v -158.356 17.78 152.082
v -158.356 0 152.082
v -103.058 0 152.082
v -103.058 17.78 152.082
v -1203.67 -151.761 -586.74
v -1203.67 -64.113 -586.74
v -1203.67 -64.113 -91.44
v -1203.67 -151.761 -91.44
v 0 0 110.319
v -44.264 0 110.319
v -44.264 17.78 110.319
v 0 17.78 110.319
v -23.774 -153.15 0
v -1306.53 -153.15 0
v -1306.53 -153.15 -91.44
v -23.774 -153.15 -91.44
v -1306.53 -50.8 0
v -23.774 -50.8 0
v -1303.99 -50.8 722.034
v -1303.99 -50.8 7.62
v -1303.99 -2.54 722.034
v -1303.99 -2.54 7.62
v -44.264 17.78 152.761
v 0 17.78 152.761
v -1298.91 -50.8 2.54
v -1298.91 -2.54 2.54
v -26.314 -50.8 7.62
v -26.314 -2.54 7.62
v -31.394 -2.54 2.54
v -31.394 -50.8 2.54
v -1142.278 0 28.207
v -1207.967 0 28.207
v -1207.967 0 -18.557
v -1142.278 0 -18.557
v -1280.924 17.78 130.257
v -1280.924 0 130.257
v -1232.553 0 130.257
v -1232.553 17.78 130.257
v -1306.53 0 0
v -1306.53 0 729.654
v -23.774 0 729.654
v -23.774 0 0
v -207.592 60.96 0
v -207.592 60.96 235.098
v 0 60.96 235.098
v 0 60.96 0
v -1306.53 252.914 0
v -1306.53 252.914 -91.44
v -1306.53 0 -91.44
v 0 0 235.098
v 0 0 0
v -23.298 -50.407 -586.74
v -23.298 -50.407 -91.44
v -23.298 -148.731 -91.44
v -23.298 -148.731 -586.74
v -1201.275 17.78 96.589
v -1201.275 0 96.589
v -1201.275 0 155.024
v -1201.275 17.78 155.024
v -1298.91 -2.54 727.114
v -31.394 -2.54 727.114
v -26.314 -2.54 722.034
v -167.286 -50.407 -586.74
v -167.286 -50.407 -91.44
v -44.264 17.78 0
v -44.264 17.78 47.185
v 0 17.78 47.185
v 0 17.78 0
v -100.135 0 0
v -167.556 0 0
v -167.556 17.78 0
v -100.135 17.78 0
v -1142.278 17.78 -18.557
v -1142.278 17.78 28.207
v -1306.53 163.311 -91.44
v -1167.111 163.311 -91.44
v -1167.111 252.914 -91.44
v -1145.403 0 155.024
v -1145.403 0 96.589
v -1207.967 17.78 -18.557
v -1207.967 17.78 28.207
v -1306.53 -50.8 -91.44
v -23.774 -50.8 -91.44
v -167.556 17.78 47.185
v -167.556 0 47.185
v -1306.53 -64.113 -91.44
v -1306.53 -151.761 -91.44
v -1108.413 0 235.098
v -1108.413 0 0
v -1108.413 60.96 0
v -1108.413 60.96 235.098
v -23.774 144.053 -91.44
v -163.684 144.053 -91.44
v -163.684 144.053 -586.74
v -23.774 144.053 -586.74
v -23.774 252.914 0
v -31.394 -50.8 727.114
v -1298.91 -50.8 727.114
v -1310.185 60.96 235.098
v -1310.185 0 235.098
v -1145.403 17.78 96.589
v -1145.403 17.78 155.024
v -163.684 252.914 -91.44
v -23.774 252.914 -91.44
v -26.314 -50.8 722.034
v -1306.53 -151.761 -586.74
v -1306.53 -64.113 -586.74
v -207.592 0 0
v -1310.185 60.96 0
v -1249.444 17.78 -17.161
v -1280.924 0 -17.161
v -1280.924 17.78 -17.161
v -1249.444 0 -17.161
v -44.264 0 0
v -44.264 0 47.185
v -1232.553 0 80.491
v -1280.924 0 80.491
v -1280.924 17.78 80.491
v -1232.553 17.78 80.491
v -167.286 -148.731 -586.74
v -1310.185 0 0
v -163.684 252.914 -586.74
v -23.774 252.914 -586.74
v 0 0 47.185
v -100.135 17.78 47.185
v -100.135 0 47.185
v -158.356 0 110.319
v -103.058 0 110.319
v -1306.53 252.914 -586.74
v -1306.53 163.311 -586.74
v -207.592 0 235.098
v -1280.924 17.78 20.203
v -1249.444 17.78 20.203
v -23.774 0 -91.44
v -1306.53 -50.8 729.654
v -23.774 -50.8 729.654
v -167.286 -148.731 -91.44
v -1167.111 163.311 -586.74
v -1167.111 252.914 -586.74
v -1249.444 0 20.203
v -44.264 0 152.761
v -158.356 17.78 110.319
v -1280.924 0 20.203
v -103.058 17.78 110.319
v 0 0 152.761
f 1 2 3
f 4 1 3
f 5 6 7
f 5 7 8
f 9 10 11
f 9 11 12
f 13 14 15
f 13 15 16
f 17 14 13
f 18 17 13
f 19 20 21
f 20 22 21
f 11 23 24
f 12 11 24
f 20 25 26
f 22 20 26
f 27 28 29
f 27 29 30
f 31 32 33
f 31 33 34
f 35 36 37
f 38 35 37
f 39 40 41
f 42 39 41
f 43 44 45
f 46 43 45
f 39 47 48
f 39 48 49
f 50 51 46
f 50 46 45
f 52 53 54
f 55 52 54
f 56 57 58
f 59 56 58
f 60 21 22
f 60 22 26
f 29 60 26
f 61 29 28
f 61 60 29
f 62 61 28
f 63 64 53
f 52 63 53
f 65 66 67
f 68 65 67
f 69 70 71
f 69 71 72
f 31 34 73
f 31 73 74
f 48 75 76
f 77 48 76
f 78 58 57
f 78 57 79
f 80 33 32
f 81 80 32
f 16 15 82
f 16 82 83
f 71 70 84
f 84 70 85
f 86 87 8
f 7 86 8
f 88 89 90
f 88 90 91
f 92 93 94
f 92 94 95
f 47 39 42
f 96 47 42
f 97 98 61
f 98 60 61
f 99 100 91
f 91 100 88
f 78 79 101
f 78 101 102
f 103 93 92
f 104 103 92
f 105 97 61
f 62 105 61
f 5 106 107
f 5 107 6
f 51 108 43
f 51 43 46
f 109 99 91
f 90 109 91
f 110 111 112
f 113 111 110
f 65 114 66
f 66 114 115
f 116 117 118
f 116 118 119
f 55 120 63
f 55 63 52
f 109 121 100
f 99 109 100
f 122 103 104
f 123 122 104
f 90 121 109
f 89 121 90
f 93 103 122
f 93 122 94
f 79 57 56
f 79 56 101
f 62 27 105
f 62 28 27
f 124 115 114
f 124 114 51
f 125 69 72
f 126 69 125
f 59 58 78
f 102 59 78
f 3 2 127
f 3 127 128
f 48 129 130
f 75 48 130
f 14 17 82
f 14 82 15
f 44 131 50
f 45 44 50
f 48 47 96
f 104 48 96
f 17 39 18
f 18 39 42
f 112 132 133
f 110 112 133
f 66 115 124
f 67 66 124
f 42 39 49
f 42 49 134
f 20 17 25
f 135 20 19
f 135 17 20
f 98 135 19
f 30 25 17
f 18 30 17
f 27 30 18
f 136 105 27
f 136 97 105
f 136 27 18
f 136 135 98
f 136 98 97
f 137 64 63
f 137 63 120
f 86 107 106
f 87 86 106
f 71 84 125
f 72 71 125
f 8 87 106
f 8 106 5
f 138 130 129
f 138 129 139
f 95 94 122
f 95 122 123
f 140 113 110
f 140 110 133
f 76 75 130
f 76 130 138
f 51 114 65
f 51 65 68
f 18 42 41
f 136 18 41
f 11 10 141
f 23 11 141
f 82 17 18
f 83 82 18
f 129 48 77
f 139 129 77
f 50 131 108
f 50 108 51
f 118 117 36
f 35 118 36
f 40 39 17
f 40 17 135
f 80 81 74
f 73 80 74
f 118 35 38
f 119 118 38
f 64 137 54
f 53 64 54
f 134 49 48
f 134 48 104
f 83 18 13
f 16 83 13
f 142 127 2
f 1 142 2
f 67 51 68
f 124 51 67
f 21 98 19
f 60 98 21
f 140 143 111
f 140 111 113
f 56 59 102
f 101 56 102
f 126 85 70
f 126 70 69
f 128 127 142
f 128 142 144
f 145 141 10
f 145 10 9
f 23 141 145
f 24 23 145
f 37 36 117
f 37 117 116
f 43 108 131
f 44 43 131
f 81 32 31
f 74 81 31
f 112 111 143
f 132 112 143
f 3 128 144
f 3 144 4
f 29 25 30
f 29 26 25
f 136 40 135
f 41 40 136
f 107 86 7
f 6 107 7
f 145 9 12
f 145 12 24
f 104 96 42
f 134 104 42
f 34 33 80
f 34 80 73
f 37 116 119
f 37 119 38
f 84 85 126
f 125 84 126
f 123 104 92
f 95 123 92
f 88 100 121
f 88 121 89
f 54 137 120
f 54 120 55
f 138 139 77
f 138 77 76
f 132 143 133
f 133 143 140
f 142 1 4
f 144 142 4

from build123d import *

# Parameters (mm, degrees)
F0_W      = 1282.7554736286
F0_H      = 729.6538352966
F1_DEPTH  = 50.8
F2_T      = -2.54
F3_SIZE   = 5.08
F4_W      = 1282.7554736286
F4_H      = 252.9141306877
F5_DEPTH  = 91.44
F4_H_2    = 102.3504243612
F6_W      = 102.859377861
F6_H      = 87.6475647092
F7_DEPTH  = 495.3
F6_W_2    = 139.9095300585
F6_H_2    = 108.8606417179
F6_W_3    = 139.4186019897
F6_H_3    = 89.6030068398
F6_W_4    = 143.9883280545
F6_H_4    = 98.3233042061
F8_W      = 207.591548562
F8_H      = 235.0982874632
F9_DEPTH  = 60.96
F8_W_2    = 201.7714977264
F10_W     = 44.2638136446
F10_H     = 42.4424037337
F11_DEPTH = 17.78
F10_W_2   = 55.2980303764
F10_H_2   = 41.7627468705
F10_H_3   = 47.184728086
F10_W_3   = 67.4202218652
F10_W_4   = 55.8717250824
F10_H_4   = 58.4349855781
F10_W_5   = 48.3711957932
F10_H_5   = 49.7663617134
F10_W_6   = 65.6886100769
F10_H_6   = 46.763850376
F10_W_7   = 31.4800739288
F10_H_7   = 37.3639315367


with BuildPart() as f1:
    # F0 (on Front) → F1 (new body)
    with BuildSketch(Plane.XZ):
        with Locations((-665.1519043371, 364.8269176483)):
            Rectangle(F0_W, F0_H)
    extrude(amount=F1_DEPTH)

    # F2
    f2_openings = [f1.faces().sort_by_distance(p)[0] for p in [
        (-665.151904, -50.8, 364.826918),
    ]]
    offset(amount=F2_T, openings=f2_openings)

    # F3
    f3_edges = [f1.edges().sort_by_distance(p)[0] for p in [
        (-1303.989641, -26.67, 727.113835),
        (-26.314168, -26.67, 727.113835),
        (-1303.989641, -26.67, 2.54),
        (-26.314168, -26.67, 2.54),
    ]]
    chamfer(f3_edges, length=F3_SIZE)


with BuildPart() as f5:
    # F4 (on face) → F5 (new body)
    with BuildSketch(Plane(origin=(0, 0, 0), x_dir=(1, 0, 0), z_dir=(0, 0, -1))):
        with Locations((-665.1519043371, -126.4570653439)):
            Rectangle(F4_W, F4_H)
    extrude(amount=F5_DEPTH)


with BuildPart() as f5b:
    # F4 (on face) → F5, piece 2 (new body)
    with BuildSketch(Plane(origin=(0, 0, 0), x_dir=(1, 0, 0), z_dir=(0, 0, -1))):
        with Locations((-665.1519043371, 101.9752121806)):
            Rectangle(F4_W, F4_H_2)
    extrude(amount=F5_DEPTH)


with BuildPart() as f7:
    # F6 (on face) → F7 (new body)
    with BuildSketch(Plane(origin=(0, 0, -91.44), x_dir=(1, 0, 0), z_dir=(0, 0, -1))):
        with Locations((-1255.0999522209, 107.9371087253)):
            Rectangle(F6_W, F6_H)
    extrude(amount=F7_DEPTH)


with BuildPart() as f7b:
    # F6 (on face) → F7, piece 2 (new body)
    with BuildSketch(Plane(origin=(0, 0, -91.44), x_dir=(1, 0, 0), z_dir=(0, 0, -1))):
        with Locations((-93.728932552, -198.4838098288)):
            Rectangle(F6_W_2, F6_H_2)
    extrude(amount=F7_DEPTH)


with BuildPart() as f7c:
    # F6 (on face) → F7, piece 3 (new body)
    with BuildSketch(Plane(origin=(0, 0, -91.44), x_dir=(1, 0, 0), z_dir=(0, 0, -1))):
        with Locations((-1236.8203401566, -208.1126272678)):
            Rectangle(F6_W_3, F6_H_3)
    extrude(amount=F7_DEPTH)


with BuildPart() as f7d:
    # F6 (on face) → F7, piece 4 (new body)
    with BuildSketch(Plane(origin=(0, 0, -91.44), x_dir=(1, 0, 0), z_dir=(0, 0, -1))):
        with Locations((-95.2921872959, 99.5689239353)):
            Rectangle(F6_W_4, F6_H_4)
    extrude(amount=F7_DEPTH)


with BuildPart() as f9:
    # F8 (on Front) → F9 (new body)
    with BuildSketch(Plane.XZ):
        with Locations((-103.795774281, 117.5491437316)):
            Rectangle(F8_W, F8_H)
    extrude(amount=-F9_DEPTH)


with BuildPart() as f9b:
    # F8 (on Front) → F9, piece 2 (new body)
    with BuildSketch(Plane.XZ):
        with Locations((-1209.2992067337, 117.5491437316)):
            Rectangle(F8_W_2, F8_H)
    extrude(amount=-F9_DEPTH)


with BuildPart() as f11:
    # F10 (on Front) → F11 (new body)
    with BuildSketch(Plane.XZ):
        with Locations((-22.1319068223, 131.5400190651)):
            Rectangle(F10_W, F10_H)
    extrude(amount=-F11_DEPTH)


with BuildPart() as f11b:
    # F10 (on Front) → F11, piece 2 (new body)
    with BuildSketch(Plane.XZ):
        with Locations((-130.7073384523, 131.2001906335)):
            Rectangle(F10_W_2, F10_H_2)
    extrude(amount=-F11_DEPTH)


with BuildPart() as f11c:
    # F10 (on Front) → F11, piece 3 (new body)
    with BuildSketch(Plane.XZ):
        with Locations((-22.1319068223, 23.592364043)):
            Rectangle(F10_W, F10_H_3)
    extrude(amount=-F11_DEPTH)


with BuildPart() as f11d:
    # F10 (on Front) → F11, piece 4 (new body)
    with BuildSketch(Plane.XZ):
        with Locations((-133.8455490768, 23.592364043)):
            Rectangle(F10_W_3, F10_H_3)
    extrude(amount=-F11_DEPTH)


with BuildPart() as f11e:
    # F10 (on Front) → F11, piece 5 (new body)
    with BuildSketch(Plane.XZ):
        with Locations((-1173.339009285, 125.806171447)):
            Rectangle(F10_W_4, F10_H_4)
    extrude(amount=-F11_DEPTH)


with BuildPart() as f11f:
    # F10 (on Front) → F11, piece 6 (new body)
    with BuildSketch(Plane.XZ):
        with Locations((-1256.7382454872, 105.3742915392)):
            Rectangle(F10_W_5, F10_H_5)
    extrude(amount=-F11_DEPTH)


with BuildPart() as f11g:
    # F10 (on Front) → F11, piece 7 (new body)
    with BuildSketch(Plane.XZ):
        with Locations((-1175.1223802567, 4.824702628)):
            Rectangle(F10_W_6, F10_H_6)
    extrude(amount=-F11_DEPTH)


with BuildPart() as f11h:
    # F10 (on Front) → F11, piece 8 (new body)
    with BuildSketch(Plane.XZ):
        with Locations((-1265.1838064194, 1.5210304409)):
            Rectangle(F10_W_7, F10_H_7)
    extrude(amount=-F11_DEPTH)


solid = Compound([f1.part, f5.part, f5b.part, f7.part, f7b.part, f7c.part, f7d.part, f9.part, f9b.part, f11.part, f11b.part, f11c.part, f11d.part, f11e.part, f11f.part, f11g.part, f11h.part])
